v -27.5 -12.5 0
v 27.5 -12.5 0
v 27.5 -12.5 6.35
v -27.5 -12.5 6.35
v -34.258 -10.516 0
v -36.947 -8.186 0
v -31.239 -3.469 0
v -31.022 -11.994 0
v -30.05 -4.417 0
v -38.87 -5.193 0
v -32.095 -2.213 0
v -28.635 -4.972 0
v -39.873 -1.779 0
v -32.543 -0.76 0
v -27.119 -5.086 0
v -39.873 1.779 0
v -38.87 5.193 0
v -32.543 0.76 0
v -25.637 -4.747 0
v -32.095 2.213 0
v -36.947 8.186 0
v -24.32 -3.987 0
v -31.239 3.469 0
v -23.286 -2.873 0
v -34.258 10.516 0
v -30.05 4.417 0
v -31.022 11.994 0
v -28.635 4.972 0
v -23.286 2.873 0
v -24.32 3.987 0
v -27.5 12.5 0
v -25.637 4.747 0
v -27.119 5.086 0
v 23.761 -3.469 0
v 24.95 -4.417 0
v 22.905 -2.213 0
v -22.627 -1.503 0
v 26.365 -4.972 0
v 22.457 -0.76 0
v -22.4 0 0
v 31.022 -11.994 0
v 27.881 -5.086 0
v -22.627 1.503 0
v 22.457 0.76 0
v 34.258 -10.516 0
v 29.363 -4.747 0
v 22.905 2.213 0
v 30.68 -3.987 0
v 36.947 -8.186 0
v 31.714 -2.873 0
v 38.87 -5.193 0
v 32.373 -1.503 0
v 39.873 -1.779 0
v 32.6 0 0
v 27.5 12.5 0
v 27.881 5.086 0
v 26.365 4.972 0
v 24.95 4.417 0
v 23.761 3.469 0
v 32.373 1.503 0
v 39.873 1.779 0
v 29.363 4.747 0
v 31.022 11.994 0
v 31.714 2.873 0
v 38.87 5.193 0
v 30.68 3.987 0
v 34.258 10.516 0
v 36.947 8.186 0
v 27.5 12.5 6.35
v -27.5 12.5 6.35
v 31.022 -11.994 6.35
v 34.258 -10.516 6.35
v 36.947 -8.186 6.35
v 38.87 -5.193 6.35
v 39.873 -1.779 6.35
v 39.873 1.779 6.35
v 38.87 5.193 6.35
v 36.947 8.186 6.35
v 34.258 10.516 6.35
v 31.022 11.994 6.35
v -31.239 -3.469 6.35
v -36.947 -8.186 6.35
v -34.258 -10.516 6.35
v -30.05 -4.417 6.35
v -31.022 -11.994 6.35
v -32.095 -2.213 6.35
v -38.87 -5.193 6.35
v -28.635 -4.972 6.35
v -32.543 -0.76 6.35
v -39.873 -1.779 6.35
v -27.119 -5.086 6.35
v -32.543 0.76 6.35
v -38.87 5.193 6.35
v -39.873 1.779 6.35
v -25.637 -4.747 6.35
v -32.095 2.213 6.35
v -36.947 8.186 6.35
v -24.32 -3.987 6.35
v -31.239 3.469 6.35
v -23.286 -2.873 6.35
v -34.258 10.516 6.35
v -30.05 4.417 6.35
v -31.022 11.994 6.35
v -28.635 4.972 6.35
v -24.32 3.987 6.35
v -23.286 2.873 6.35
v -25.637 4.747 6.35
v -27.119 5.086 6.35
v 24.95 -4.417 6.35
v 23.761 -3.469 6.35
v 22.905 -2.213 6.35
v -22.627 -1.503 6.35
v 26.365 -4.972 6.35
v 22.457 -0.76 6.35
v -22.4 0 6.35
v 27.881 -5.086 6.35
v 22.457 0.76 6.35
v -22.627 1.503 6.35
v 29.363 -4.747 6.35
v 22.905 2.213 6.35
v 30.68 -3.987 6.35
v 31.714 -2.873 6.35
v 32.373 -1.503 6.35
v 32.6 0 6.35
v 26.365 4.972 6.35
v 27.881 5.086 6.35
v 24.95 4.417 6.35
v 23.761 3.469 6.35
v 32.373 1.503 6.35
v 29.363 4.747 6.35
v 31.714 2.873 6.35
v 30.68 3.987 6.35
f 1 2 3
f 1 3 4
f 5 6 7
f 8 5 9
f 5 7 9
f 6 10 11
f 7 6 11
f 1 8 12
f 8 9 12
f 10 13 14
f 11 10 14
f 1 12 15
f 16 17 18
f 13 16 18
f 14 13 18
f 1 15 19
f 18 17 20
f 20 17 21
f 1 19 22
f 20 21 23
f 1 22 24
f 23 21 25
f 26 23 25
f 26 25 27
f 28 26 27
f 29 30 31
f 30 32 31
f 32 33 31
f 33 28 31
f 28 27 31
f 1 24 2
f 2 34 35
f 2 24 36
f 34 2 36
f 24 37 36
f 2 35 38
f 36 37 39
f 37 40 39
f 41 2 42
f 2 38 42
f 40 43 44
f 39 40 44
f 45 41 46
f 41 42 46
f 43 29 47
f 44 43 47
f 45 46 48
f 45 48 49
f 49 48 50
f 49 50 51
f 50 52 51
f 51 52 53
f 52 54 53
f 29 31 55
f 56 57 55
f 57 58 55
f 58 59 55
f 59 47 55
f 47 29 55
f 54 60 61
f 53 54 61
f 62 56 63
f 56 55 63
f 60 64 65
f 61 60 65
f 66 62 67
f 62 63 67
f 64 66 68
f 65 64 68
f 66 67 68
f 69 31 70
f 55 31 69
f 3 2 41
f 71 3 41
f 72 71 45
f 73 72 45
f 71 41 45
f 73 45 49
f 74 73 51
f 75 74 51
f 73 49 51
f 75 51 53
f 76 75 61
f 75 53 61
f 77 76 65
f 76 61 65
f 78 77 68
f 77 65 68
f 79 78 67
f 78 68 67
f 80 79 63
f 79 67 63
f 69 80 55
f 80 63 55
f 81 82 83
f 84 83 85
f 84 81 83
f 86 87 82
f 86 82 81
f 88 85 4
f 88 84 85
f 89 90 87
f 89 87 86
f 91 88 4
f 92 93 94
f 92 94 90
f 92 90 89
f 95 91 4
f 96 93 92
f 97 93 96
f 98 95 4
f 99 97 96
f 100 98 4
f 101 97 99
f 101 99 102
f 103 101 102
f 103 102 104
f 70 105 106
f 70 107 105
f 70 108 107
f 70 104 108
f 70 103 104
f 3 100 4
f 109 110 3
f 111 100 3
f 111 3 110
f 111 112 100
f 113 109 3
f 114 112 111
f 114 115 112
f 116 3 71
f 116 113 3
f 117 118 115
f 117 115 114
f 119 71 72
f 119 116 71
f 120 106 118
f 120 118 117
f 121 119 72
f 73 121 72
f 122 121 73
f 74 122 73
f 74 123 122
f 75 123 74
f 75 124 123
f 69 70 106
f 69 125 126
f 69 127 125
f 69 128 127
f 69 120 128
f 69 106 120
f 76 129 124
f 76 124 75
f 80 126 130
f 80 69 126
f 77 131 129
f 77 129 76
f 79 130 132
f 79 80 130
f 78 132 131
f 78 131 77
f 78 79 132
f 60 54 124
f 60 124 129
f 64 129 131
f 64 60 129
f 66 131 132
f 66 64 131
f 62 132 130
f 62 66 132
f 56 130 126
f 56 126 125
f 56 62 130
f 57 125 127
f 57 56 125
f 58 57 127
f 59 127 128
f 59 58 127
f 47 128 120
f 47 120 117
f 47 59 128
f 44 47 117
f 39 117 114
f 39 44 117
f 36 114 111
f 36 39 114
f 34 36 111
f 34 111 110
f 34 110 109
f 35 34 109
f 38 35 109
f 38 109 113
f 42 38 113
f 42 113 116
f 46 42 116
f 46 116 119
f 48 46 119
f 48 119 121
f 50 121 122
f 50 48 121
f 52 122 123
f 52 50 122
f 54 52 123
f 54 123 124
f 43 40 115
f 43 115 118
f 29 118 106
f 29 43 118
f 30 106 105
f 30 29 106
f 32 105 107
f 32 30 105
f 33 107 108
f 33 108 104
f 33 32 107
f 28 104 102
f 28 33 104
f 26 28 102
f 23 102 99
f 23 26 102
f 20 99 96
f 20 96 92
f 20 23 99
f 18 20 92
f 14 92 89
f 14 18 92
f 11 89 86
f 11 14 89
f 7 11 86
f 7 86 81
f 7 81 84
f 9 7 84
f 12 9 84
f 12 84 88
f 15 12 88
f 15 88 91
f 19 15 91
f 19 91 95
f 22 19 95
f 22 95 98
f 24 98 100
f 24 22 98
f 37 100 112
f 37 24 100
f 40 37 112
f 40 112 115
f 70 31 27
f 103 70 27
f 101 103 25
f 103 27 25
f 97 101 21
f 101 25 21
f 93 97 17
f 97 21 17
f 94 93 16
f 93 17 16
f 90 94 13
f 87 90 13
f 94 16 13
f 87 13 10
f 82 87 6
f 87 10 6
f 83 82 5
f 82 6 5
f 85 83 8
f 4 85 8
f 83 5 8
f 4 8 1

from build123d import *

# Parameters (mm, degrees)
SKETCH_R  = 5.1
PAD_DEPTH = 6.35


with BuildPart() as part:
    # Sketch → Pad (new body)
    with BuildSketch(Plane.XY):
        with BuildLine():
            ThreePointArc((-27.5, 12.5), (-40, 1e-06), (-27.500002, -12.5))
            Line((27.499963, -12.5), (-27.500002, -12.5))
            ThreePointArc((27.499963, -12.5), (39.999963, -1.8e-05), (27.5, 12.5))
            Line((-27.5, 12.5), (27.5, 12.5))
        make_face()
        with Locations((-27.5, 0)):
            Circle(SKETCH_R, mode=Mode.SUBTRACT)
        with Locations((27.499963, 0)):
            Circle(SKETCH_R, mode=Mode.SUBTRACT)
    extrude(amount=PAD_DEPTH)


solid = part.part
